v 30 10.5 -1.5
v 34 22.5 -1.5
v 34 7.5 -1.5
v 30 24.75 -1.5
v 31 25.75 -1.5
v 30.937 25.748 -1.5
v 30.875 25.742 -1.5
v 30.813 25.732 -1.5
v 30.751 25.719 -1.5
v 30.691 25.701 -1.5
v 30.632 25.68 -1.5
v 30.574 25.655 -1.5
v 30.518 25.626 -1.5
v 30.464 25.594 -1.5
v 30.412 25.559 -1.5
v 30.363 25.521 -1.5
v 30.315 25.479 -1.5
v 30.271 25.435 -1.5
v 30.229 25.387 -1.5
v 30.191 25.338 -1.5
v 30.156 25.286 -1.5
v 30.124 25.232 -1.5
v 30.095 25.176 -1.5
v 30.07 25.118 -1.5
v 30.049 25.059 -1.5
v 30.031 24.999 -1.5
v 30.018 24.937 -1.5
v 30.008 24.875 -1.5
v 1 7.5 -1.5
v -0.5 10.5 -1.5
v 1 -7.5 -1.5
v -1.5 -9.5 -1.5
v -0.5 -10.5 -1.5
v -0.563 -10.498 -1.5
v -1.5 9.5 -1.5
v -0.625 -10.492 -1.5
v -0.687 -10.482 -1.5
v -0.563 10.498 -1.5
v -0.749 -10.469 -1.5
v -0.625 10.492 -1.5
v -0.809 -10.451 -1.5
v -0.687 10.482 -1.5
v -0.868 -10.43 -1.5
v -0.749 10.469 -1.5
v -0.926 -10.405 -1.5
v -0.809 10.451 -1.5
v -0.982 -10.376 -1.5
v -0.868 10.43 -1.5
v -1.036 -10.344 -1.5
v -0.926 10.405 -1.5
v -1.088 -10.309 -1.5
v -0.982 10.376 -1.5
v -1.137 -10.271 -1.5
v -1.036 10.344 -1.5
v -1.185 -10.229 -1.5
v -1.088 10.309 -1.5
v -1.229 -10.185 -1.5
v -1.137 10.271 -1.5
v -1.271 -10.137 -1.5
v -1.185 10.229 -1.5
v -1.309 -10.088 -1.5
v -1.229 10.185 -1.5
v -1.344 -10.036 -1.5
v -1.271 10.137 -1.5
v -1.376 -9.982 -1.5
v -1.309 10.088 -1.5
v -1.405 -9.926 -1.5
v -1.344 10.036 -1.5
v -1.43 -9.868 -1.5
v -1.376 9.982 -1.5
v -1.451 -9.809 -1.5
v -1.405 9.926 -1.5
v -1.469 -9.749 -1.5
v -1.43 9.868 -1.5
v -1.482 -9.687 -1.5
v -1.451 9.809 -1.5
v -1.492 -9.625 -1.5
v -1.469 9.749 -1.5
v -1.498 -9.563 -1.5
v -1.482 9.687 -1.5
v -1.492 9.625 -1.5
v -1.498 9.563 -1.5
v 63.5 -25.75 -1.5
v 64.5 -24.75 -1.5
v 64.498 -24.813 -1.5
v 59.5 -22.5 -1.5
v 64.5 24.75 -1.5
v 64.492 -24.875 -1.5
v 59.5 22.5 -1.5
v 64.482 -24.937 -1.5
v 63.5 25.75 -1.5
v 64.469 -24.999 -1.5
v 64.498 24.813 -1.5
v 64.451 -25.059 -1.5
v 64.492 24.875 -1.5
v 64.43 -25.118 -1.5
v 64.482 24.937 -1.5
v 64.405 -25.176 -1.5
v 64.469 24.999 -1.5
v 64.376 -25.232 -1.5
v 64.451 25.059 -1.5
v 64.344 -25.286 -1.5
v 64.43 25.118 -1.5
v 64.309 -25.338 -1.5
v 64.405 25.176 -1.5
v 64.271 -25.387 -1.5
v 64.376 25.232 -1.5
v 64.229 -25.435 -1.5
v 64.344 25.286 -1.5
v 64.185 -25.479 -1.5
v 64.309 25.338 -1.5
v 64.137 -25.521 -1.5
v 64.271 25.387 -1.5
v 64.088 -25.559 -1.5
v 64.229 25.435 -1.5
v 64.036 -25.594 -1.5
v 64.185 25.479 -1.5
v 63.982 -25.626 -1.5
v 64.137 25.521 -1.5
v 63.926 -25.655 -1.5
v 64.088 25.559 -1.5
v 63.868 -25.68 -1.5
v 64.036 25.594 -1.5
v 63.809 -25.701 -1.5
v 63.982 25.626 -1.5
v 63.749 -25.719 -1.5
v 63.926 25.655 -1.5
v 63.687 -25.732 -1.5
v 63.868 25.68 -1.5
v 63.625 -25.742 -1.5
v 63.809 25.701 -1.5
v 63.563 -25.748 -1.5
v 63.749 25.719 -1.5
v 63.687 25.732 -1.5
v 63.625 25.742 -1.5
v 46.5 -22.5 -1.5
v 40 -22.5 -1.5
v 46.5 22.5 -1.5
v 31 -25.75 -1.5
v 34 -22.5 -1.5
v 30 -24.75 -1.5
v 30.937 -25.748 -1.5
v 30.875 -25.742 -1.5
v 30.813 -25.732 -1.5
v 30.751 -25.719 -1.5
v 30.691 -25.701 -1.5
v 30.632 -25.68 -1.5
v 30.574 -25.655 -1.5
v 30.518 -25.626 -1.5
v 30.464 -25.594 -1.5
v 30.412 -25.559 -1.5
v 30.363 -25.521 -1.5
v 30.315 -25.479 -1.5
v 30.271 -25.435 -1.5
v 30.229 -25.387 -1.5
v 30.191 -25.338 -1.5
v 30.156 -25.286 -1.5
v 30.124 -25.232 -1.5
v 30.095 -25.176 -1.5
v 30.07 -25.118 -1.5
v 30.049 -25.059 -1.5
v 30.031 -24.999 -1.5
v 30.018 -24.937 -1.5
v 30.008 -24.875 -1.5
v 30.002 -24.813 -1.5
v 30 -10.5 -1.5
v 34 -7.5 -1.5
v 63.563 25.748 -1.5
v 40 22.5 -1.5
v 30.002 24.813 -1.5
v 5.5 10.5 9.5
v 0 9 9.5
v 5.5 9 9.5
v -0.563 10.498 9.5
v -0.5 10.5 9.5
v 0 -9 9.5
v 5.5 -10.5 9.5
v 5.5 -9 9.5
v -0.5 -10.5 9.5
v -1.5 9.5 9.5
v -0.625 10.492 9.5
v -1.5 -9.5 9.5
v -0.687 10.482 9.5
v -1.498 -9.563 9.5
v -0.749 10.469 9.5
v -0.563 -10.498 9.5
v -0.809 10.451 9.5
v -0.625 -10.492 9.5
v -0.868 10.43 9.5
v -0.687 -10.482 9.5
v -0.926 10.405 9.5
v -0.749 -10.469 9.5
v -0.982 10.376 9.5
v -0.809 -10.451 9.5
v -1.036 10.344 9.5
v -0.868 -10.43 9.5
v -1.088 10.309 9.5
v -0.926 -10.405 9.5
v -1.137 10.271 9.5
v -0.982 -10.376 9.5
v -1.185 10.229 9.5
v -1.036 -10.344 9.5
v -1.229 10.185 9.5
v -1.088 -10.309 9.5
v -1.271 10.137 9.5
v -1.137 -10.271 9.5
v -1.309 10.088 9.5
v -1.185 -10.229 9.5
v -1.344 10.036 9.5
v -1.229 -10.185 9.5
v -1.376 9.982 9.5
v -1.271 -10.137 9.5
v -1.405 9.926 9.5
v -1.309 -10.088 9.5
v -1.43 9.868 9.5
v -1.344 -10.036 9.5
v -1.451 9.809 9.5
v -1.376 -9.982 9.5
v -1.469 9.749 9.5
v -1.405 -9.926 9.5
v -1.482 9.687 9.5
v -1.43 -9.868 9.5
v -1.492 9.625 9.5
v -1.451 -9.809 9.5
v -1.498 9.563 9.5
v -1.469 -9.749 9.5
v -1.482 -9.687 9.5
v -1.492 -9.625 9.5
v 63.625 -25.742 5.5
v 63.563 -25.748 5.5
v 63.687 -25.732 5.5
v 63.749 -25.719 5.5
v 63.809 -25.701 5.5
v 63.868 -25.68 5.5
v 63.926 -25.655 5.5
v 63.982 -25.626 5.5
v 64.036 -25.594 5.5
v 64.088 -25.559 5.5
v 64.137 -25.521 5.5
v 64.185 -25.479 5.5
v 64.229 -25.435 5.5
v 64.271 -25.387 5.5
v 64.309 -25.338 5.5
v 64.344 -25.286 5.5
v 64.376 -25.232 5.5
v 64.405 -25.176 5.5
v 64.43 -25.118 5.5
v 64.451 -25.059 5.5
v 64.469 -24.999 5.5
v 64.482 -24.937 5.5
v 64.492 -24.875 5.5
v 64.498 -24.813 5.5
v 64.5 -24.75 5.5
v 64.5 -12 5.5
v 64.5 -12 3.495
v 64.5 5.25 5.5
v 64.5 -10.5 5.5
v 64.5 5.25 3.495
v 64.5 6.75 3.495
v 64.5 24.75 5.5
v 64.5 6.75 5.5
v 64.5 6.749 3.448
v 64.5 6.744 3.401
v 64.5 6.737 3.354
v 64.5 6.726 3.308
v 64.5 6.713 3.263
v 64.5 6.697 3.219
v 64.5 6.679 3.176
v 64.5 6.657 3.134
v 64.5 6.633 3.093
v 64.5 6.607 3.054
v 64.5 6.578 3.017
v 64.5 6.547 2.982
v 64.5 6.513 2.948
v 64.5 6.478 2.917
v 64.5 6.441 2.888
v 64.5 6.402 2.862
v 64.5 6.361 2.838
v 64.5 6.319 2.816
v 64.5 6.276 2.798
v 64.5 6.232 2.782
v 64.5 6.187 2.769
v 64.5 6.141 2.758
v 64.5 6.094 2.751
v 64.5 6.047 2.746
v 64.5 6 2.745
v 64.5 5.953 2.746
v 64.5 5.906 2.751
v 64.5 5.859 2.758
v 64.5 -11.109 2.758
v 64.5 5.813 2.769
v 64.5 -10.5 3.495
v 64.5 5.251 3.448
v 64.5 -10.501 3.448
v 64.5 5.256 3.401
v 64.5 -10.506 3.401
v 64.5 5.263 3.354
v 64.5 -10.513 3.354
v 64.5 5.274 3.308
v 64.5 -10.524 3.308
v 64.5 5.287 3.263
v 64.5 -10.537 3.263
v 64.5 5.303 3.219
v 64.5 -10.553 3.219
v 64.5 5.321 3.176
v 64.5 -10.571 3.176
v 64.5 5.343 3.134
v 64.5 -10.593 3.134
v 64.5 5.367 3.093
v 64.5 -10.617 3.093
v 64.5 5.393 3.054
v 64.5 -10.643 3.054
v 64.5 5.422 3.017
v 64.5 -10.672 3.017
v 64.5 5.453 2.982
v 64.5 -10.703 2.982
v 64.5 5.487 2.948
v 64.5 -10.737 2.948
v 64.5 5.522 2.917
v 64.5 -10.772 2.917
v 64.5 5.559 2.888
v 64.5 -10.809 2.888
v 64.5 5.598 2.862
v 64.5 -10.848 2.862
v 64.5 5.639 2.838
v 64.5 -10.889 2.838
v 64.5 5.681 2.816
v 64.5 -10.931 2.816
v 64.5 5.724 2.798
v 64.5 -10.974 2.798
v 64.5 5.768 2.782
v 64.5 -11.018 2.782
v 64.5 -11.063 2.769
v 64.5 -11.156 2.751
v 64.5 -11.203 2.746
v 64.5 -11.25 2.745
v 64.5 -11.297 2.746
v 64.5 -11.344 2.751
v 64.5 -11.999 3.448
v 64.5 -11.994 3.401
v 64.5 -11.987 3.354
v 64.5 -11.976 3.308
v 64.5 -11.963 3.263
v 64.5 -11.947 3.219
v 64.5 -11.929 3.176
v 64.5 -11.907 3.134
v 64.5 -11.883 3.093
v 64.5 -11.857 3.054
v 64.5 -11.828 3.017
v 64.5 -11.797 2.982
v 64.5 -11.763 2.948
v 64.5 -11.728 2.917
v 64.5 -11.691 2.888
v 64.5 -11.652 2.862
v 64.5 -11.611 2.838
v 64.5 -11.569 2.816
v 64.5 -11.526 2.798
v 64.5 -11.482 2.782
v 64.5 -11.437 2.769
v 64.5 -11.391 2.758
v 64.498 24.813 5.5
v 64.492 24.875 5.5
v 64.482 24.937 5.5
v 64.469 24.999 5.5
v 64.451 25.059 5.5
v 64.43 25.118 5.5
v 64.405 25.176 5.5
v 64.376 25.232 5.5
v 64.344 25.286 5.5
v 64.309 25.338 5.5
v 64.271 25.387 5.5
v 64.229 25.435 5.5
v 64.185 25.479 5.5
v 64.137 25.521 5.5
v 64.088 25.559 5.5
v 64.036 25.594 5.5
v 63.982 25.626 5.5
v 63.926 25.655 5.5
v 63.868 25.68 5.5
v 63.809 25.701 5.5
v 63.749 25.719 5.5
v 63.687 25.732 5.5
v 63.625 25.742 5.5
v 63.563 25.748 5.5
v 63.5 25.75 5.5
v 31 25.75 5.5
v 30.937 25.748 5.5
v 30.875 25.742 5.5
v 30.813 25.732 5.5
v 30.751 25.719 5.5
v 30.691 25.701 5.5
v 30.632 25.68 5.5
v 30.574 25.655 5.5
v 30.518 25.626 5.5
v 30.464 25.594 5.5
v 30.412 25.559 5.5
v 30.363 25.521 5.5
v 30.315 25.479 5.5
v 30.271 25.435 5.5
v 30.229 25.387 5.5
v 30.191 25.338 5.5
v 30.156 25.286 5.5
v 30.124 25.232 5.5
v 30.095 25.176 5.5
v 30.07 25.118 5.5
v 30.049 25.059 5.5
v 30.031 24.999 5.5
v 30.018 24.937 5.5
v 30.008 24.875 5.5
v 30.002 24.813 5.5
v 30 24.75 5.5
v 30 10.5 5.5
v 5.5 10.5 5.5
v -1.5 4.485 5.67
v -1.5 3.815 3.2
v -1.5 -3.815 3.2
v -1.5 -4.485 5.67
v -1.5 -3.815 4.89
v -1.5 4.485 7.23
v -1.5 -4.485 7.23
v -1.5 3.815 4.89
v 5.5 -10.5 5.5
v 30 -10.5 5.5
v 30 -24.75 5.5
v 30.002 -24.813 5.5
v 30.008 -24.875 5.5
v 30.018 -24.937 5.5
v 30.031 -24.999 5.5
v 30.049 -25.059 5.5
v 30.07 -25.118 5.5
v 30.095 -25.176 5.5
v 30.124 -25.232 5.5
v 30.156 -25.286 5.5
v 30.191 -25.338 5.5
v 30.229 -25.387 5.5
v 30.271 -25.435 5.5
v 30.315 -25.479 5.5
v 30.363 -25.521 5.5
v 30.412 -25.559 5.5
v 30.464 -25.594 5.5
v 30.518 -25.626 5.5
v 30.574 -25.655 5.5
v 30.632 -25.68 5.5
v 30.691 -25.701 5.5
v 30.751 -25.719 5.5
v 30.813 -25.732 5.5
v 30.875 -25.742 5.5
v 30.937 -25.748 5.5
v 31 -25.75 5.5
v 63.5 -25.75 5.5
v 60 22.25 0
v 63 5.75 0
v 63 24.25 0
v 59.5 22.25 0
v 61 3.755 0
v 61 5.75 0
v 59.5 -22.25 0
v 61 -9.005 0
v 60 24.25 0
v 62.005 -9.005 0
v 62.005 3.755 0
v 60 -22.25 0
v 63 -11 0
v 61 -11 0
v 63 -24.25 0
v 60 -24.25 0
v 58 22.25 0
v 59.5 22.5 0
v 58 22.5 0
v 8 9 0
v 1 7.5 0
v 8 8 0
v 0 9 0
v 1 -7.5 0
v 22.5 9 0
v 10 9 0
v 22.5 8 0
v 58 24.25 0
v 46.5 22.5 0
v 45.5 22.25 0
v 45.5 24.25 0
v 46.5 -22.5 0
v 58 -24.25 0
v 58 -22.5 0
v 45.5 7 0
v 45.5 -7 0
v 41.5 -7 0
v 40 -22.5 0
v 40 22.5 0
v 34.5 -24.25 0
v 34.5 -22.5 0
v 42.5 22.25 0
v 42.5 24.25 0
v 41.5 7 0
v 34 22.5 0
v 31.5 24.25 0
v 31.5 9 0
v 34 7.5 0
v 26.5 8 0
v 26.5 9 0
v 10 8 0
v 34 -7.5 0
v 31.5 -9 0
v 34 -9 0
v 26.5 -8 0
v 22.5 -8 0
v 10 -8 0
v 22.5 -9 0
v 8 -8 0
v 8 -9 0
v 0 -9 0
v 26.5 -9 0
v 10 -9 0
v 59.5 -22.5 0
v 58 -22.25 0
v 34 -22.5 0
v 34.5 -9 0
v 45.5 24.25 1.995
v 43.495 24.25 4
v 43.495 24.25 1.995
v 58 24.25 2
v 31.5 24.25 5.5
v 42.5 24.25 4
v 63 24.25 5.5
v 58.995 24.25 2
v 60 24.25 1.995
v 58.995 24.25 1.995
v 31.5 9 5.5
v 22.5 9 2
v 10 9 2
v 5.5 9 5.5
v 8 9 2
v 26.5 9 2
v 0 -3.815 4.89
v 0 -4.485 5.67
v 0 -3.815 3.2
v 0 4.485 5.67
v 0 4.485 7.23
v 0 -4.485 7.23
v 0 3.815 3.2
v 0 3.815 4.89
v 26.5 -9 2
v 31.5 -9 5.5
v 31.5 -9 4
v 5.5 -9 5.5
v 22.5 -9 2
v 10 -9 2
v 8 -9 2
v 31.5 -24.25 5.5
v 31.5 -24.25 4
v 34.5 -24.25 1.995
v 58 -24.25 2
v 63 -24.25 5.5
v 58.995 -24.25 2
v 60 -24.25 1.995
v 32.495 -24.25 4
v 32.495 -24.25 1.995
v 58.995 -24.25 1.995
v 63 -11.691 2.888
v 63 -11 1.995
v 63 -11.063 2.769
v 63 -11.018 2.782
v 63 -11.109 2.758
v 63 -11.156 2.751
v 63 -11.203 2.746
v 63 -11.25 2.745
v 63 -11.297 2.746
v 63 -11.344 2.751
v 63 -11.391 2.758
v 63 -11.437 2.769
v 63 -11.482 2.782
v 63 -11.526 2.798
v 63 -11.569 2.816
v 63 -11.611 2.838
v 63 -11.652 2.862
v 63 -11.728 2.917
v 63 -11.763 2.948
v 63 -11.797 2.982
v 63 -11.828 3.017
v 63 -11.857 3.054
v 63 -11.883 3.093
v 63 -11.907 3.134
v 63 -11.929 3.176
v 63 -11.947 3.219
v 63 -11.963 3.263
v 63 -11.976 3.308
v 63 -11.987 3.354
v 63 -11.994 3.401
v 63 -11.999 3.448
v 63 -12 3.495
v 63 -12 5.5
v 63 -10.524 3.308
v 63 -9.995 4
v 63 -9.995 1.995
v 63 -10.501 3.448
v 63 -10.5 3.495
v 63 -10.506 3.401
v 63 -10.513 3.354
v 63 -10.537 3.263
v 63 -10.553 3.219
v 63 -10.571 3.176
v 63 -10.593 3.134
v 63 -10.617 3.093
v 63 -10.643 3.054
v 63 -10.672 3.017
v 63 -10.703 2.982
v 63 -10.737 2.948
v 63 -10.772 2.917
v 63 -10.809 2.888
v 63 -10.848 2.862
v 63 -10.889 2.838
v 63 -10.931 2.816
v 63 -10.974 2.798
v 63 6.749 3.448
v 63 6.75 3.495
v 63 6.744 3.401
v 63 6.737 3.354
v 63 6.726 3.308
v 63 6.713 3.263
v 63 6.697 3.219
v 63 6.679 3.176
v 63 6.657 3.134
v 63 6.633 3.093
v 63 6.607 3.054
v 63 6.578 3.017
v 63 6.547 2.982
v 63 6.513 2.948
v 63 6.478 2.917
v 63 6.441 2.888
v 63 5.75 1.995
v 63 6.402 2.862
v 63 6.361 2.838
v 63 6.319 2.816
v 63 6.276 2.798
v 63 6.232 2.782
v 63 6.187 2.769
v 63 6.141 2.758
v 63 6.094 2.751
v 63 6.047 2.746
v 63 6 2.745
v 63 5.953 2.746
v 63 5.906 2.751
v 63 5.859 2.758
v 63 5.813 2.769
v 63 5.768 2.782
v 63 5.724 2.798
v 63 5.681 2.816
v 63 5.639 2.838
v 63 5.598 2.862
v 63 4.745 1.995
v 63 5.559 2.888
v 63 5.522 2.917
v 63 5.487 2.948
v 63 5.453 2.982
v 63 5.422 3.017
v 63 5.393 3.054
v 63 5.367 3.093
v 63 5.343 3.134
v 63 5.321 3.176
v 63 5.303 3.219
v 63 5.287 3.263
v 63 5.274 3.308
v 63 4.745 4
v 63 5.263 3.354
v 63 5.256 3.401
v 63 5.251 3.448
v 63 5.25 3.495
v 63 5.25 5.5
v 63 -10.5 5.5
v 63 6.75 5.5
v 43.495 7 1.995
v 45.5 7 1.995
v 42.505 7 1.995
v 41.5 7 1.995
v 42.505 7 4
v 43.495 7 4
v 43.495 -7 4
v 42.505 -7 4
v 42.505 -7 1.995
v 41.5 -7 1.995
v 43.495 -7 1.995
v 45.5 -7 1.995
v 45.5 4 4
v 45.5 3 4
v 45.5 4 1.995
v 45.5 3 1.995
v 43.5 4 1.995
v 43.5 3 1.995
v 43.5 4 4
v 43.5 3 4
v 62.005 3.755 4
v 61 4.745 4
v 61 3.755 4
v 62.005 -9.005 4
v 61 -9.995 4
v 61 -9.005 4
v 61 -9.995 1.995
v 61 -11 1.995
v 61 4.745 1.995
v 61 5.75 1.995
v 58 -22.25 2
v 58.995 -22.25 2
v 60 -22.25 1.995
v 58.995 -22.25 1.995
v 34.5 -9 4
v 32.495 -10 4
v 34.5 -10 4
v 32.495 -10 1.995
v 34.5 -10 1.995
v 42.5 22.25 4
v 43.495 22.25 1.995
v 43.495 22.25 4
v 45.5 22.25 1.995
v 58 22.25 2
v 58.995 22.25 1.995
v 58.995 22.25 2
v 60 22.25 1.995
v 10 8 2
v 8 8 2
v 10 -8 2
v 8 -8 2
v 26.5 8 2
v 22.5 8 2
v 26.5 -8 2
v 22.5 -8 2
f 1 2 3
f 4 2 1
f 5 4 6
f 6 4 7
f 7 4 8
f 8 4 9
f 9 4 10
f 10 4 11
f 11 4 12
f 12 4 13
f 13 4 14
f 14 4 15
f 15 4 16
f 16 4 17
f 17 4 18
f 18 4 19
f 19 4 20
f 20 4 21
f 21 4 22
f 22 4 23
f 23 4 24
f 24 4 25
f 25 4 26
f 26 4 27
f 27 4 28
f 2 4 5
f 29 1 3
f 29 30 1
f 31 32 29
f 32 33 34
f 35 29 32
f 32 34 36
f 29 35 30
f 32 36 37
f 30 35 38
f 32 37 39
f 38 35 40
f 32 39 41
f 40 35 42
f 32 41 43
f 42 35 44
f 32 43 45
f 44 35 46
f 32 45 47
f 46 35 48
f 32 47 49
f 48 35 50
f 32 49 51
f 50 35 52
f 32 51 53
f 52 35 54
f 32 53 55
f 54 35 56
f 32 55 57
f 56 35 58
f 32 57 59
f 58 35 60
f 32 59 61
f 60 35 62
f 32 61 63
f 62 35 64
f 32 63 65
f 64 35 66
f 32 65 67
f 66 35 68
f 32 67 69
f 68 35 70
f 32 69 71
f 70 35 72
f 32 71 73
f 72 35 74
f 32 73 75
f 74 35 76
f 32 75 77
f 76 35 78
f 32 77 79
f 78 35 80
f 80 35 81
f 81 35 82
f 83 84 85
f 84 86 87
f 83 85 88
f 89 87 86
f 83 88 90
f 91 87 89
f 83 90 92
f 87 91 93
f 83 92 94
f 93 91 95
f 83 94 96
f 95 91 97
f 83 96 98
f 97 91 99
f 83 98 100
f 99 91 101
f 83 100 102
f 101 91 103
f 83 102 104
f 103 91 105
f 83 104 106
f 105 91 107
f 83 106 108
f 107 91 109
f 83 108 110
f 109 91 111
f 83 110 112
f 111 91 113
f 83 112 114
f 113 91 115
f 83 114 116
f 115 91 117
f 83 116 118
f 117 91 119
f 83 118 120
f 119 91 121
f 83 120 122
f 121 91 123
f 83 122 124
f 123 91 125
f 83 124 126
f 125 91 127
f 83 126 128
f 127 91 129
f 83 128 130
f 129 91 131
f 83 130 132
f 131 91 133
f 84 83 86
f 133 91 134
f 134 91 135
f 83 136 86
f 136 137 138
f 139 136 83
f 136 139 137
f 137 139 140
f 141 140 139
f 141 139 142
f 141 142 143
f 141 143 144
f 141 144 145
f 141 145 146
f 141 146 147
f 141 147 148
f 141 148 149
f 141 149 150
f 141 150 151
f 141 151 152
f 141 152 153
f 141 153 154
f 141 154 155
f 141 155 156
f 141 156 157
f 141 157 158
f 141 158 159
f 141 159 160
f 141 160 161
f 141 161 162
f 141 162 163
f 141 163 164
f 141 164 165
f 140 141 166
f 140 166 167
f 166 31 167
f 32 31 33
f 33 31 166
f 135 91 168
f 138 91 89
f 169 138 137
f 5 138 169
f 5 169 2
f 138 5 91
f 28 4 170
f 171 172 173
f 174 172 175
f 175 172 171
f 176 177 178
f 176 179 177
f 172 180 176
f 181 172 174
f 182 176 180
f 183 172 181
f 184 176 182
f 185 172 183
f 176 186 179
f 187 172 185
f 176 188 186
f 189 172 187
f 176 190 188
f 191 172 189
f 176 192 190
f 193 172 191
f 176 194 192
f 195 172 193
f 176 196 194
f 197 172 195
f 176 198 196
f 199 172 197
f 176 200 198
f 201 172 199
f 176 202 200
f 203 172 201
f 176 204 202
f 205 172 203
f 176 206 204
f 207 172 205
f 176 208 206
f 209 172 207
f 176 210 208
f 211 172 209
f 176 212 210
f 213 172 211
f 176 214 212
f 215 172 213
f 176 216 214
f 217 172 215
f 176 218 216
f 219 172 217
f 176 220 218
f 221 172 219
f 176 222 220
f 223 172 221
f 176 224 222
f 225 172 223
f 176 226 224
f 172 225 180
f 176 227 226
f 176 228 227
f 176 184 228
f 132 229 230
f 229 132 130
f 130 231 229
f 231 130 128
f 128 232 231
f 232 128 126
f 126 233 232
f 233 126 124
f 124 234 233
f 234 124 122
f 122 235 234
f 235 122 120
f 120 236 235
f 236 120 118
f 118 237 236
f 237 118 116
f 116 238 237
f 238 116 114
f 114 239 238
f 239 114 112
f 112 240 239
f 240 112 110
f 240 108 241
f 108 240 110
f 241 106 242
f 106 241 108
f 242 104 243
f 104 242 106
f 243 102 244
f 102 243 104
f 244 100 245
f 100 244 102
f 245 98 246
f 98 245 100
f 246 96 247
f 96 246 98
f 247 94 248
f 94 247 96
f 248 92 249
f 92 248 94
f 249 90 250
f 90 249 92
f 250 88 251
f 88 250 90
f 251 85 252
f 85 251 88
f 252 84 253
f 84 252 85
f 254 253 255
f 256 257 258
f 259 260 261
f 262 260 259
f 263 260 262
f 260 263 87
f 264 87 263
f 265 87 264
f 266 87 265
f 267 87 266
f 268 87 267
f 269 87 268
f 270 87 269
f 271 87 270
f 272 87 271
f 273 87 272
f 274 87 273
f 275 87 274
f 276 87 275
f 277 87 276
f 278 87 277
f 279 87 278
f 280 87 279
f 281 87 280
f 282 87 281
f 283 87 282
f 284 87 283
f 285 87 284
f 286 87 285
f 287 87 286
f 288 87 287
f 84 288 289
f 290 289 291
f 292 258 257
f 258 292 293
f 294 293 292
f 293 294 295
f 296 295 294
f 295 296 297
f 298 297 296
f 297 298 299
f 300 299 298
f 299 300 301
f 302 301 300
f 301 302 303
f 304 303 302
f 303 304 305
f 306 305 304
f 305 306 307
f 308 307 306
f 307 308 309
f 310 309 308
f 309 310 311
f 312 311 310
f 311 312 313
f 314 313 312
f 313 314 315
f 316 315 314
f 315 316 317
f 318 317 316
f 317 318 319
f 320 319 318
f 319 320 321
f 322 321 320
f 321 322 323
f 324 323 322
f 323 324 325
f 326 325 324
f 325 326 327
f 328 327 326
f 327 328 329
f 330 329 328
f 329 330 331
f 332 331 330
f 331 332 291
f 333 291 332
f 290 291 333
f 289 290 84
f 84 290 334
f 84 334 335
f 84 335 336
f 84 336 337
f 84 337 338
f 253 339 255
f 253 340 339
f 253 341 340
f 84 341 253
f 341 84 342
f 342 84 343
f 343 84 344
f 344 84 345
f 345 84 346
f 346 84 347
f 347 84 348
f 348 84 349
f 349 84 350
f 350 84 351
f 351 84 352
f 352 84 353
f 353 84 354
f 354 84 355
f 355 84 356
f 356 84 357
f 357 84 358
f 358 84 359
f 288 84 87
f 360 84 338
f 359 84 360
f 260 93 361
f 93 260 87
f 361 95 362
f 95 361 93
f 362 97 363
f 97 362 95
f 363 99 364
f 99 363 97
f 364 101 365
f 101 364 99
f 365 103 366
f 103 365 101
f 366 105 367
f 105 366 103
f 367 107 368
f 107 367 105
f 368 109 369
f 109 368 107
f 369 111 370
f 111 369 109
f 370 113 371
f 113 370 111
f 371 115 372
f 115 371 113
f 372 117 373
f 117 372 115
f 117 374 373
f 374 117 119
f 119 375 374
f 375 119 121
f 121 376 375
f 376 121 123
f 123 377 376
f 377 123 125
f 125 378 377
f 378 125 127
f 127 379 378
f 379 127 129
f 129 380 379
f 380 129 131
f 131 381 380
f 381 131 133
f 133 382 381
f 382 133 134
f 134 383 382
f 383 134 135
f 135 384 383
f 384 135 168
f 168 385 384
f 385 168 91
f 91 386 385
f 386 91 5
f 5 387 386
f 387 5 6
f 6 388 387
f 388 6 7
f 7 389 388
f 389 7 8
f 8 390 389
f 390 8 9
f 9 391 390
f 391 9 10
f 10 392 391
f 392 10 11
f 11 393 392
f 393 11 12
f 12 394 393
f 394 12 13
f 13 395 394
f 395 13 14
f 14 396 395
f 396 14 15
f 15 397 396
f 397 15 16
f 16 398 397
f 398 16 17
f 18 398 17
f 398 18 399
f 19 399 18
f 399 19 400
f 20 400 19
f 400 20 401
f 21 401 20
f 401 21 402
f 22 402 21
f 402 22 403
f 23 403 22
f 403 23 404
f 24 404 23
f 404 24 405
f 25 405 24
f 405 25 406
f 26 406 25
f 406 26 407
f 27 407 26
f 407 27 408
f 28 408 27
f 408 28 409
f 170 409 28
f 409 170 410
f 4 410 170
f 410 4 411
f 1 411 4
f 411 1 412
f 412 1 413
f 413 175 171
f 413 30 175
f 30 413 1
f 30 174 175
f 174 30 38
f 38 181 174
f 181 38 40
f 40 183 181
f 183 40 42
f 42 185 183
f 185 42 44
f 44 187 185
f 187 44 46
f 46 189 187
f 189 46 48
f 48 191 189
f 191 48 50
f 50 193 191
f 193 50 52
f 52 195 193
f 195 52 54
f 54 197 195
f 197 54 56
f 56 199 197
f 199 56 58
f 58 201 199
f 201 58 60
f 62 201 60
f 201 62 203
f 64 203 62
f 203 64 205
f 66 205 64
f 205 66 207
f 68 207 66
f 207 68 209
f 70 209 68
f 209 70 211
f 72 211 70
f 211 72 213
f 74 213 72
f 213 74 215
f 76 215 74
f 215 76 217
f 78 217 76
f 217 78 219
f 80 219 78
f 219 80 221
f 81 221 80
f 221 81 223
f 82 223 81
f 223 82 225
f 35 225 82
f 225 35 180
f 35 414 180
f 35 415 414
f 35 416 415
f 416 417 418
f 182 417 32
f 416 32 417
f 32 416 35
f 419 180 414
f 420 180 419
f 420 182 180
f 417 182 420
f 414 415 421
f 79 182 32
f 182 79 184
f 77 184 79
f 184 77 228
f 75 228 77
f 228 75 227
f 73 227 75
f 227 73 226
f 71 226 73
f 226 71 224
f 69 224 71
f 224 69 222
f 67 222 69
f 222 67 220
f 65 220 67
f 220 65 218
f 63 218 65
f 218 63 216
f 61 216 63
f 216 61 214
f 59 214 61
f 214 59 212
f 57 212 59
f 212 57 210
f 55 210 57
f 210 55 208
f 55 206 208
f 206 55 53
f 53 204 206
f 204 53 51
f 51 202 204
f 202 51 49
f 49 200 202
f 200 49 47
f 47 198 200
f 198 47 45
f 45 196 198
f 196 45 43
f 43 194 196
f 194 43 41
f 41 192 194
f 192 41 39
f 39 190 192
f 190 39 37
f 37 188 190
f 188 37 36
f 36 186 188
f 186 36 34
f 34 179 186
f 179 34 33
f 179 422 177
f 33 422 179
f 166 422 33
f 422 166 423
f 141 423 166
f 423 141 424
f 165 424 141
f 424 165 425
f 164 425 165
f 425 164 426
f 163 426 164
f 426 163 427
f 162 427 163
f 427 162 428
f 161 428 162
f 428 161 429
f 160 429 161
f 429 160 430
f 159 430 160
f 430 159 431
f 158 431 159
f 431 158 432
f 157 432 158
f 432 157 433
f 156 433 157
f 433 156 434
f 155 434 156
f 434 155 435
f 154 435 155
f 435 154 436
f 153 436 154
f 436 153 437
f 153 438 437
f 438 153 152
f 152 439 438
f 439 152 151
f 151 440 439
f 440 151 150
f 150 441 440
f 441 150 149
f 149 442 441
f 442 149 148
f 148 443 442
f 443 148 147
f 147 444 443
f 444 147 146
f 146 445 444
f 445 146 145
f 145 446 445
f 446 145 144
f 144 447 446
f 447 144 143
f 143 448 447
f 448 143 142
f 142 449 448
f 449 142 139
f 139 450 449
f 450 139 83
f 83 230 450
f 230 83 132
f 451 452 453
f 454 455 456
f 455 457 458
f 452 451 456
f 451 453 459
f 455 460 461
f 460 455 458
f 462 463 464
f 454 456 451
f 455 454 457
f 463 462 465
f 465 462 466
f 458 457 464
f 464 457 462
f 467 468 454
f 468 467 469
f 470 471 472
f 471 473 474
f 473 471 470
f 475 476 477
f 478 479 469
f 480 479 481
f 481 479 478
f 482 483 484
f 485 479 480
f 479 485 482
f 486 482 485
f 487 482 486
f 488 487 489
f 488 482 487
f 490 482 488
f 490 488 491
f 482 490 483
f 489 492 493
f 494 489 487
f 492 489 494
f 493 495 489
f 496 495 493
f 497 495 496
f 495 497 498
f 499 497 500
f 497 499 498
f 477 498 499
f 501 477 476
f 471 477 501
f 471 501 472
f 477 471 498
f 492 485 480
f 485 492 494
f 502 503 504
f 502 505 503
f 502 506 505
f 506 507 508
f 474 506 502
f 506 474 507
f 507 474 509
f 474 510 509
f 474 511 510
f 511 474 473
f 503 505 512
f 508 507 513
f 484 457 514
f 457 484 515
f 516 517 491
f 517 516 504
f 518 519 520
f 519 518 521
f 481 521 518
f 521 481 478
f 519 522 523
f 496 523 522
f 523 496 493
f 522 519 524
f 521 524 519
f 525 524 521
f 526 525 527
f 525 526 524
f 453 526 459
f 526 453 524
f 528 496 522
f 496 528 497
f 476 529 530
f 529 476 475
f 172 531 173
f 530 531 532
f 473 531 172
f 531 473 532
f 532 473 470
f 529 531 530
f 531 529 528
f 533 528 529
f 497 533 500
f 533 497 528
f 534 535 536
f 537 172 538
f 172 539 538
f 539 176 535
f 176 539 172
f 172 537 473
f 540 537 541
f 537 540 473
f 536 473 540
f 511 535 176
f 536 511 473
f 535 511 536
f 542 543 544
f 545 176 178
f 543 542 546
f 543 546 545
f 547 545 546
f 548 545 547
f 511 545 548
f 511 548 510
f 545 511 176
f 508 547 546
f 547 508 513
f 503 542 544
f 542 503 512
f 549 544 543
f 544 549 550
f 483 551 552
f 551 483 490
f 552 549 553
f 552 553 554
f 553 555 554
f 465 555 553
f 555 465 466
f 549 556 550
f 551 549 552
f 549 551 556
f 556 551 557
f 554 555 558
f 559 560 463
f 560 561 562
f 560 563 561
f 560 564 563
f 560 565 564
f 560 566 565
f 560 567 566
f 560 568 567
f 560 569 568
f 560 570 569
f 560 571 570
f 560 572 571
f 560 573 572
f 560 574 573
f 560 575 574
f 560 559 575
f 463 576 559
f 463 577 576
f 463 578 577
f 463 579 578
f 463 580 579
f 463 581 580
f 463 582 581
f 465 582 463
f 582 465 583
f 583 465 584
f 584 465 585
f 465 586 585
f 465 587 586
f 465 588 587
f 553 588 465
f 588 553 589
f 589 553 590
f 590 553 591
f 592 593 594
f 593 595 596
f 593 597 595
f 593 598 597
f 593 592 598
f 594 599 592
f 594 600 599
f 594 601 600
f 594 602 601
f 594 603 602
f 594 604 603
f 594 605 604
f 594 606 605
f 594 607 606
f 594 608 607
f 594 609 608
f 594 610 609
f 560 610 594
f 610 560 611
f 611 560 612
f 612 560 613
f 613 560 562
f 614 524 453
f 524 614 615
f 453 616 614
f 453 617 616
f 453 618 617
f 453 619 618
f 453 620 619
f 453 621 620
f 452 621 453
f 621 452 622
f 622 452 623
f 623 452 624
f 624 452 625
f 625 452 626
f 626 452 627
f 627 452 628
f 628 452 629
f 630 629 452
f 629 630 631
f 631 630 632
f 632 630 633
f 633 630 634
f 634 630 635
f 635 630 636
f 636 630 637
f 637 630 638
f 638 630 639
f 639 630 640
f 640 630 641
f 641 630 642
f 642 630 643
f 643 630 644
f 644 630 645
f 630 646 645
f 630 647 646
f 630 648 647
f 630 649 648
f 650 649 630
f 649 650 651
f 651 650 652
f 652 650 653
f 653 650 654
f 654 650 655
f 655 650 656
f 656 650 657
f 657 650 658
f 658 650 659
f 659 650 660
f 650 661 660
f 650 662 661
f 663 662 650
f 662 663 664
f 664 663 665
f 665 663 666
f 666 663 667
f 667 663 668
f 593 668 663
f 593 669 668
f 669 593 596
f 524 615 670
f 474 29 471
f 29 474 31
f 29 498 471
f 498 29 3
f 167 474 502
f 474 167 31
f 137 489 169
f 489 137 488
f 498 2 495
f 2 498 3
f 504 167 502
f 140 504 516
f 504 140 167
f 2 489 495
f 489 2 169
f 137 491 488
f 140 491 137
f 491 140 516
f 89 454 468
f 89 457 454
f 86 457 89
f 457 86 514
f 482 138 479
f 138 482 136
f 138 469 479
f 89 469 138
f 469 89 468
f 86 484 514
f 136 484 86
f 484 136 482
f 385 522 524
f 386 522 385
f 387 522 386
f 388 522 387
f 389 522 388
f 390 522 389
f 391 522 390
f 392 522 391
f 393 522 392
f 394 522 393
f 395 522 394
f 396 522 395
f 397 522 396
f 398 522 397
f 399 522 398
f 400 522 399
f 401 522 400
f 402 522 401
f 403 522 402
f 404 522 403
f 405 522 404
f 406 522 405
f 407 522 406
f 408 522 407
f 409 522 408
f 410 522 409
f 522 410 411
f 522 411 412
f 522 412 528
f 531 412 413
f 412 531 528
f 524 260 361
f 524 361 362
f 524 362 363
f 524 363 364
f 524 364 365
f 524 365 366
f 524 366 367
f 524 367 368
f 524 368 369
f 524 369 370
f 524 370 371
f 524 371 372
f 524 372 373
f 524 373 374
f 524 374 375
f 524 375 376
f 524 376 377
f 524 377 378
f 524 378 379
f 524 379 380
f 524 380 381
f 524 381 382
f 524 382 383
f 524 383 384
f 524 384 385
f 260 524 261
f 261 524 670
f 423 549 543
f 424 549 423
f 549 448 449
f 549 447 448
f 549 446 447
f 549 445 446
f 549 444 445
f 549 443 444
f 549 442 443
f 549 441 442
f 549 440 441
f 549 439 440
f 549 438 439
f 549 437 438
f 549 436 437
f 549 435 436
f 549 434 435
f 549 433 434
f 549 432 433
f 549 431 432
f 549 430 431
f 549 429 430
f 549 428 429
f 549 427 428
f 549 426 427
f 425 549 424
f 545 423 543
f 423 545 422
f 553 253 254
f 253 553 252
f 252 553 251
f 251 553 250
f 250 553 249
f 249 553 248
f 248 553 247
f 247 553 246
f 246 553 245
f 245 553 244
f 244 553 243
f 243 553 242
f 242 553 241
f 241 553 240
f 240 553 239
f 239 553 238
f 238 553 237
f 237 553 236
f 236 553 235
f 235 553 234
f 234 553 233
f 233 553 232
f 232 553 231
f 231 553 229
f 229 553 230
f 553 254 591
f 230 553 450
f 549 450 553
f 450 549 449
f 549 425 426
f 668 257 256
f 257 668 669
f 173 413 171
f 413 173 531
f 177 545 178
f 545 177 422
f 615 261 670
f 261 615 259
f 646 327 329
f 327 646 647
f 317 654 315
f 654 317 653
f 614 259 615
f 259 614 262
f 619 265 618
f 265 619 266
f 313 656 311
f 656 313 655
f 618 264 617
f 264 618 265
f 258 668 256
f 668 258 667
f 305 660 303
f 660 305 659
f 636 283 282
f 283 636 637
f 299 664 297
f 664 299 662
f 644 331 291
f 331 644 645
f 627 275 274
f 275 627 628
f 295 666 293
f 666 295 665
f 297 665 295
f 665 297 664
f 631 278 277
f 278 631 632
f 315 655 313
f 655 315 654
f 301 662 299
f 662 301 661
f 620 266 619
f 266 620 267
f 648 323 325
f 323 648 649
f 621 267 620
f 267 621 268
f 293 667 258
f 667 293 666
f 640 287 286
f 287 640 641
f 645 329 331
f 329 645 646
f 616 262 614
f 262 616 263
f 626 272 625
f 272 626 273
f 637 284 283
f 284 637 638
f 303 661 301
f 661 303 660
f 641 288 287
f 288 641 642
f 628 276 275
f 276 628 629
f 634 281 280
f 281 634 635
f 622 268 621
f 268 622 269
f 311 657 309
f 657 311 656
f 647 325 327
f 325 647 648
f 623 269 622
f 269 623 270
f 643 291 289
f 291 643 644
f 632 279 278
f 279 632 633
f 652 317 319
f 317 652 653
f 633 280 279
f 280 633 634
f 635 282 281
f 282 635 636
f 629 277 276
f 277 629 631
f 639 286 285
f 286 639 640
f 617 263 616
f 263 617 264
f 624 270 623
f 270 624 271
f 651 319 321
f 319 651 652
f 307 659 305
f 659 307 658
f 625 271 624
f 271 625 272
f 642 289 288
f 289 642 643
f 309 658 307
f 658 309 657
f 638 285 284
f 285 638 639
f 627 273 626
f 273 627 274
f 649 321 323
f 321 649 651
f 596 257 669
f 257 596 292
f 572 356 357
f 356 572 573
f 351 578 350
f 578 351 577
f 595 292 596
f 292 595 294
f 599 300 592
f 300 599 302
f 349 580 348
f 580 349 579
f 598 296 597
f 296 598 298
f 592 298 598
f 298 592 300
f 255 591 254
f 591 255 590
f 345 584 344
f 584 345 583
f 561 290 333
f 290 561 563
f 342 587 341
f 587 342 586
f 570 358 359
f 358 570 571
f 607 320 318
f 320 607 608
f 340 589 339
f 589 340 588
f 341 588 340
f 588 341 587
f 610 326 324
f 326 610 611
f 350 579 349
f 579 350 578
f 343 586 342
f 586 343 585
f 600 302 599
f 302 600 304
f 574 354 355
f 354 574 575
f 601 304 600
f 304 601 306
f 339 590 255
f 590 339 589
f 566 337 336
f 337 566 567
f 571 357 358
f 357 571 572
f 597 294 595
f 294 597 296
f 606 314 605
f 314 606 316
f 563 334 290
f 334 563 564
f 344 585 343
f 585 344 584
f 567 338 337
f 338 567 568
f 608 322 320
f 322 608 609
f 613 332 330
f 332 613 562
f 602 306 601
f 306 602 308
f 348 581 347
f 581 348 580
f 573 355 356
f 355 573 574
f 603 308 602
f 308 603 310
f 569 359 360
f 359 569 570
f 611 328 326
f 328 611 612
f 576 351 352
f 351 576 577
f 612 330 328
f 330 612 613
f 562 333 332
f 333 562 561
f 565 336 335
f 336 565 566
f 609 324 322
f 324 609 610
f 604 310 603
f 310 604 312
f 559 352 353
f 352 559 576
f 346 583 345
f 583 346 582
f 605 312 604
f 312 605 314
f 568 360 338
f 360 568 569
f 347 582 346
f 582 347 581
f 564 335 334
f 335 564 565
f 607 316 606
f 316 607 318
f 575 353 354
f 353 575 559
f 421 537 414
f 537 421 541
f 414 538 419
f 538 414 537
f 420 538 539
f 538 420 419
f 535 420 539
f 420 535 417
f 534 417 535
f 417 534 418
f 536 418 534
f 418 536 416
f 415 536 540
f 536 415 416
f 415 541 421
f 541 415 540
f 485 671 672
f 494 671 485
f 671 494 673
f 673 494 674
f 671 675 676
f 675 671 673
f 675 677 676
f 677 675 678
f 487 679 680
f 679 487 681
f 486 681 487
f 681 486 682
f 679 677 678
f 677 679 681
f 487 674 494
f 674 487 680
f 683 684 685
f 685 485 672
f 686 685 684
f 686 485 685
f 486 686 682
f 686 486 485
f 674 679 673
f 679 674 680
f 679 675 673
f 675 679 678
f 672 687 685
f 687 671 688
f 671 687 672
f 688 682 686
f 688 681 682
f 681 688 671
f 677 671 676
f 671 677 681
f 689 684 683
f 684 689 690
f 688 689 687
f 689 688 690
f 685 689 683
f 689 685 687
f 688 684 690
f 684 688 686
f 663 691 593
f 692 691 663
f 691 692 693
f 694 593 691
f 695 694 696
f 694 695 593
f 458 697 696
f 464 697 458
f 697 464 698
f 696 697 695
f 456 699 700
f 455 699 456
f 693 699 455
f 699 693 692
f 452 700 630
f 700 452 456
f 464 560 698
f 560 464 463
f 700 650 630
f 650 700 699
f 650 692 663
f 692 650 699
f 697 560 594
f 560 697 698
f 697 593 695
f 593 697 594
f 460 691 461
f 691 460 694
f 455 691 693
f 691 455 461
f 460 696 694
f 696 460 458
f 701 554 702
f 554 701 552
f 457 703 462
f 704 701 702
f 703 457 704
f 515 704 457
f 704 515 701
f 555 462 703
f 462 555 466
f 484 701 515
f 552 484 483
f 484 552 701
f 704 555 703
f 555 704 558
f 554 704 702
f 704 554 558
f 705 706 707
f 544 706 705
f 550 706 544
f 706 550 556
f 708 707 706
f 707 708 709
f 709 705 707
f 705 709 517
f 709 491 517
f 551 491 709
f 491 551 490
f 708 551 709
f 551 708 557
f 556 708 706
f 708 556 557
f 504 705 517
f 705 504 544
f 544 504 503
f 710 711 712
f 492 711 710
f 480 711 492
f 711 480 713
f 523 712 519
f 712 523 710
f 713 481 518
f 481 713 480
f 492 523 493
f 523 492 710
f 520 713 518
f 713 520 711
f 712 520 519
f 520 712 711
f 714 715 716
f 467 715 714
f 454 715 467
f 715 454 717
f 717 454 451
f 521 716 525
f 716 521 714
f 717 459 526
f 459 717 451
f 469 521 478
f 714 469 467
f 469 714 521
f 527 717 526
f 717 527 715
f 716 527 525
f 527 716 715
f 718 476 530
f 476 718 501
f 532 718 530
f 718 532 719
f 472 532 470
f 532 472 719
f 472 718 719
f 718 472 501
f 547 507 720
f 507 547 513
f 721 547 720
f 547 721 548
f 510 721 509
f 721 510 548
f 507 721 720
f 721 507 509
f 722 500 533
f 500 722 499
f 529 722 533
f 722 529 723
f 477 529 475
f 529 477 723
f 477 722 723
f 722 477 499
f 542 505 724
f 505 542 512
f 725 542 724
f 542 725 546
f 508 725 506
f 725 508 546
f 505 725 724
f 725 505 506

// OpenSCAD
// file: components.scad
module usb(){
  usb_t_w = 6.9;
  usb_b_w = 5.87;
  usb_t_h = 3.1;
  usb_mt_h = 1.9;
  usb_mb_h = 1.3;
  polygon(points=[[-usb_t_w/2, usb_t_h], [-usb_t_w/2, usb_mt_h], [-usb_b_w/2, usb_mb_h], [-usb_b_w/2, 0], [usb_b_w/2, 0], [usb_b_w/2, usb_mb_h], [usb_t_w/2, usb_mt_h], [usb_t_w/2, usb_t_h]]);
};
arduino();
module arduino(h = 1.1, l = 42, w = 18){
  l = 42;
  
  led_l = 2;
  led_w = 7.5;
  led_h = 0.75;
  led_offset = [12, 0, h/2 + led_h/2];
  
  reset_base_h = 1.5;
  reset_base_l = 6;
  reset_base_w = 3;
  reset_button_h = 1;
  reset_button_l = 2.5;
  reset_button_w = 1;
  reset_base_offset = [4 + reset_base_w/2, 0, h/2 + reset_base_h/2];
  reset_button_offset = [4 + reset_base_w/2, 0, h/2 + reset_base_h + reset_button_h/2];
  
  usb_l = 9;
  usb_w = 7;
  usb_h = 4;
  usb_offset = [-l/2 + 3, 0, 1.5 + h/2];
  
  capa_l = 3;
  capa_w = 1.5;
  capa_h = 1.5;
  
  
  reserved_w = 2;
  reserved_h = 3;
  
  digital_l = 5;
  digital_reserved_offset = [5.5, w/2 - reserved_w/2, 0];
  
  power_l = 8;
  power_reserved_offset = [12.5, -w/2 + reserved_w/2, 0];
  
  union()
  
  color("green")
  cube([l, w, h], center=true);
  
  translate(led_offset)
  color("grey")
  cube([led_l, led_w, led_h], center=true);
  
  translate(reset_base_offset)
  color("grey")
  cube([reset_base_w, reset_base_l, reset_base_h], center=true);
  
  translate(reset_button_offset)
  color("white")
  cube([reset_button_w, reset_button_l, reset_button_h], center=true);
  
  translate(usb_offset)
  color("grey")
  union(){
    translate([-3, 0, -1.1])
    rotate([90, 0, 90])
    linear_extrude(2, center=true){
      usb();
    }
    cube([usb_l-4, usb_w, usb_h], center=true);
  }
  
  translate([-l/2 +2, 5, -t/2 - capa_h/2])
  color("orange")
  cube([capa_l, capa_w, capa_h], center=true);
  
  translate([l/2 -8, -3, -t/2 - capa_h/2])
  color("orange")
  cube([capa_l, capa_w, capa_h], center=true);
  
  translate(digital_reserved_offset)
  color("white")
  cube([digital_l, reserved_w, reserved_h], center=true);
  
  translate(power_reserved_offset)
  color("white")
  cube([power_l, reserved_w, reserved_h], center=true);
}

module tx(l = 19, w = 19, t = 1){  
  transmitter_h = 3;
  transmitter_r = 4.5;
  transmitter_offset = [0, 3, transmitter_h/2];
  
  coil1_h = 3;
  coil1_l = 6;
  coil1_offset = [-3, -5, coil1_h/2 + t/2];
  
  coil2_h = 3;
  coil2_l = 3;
  coil2_offset = [3, -5, coil1_h/2 + t/2];
  
  chip_l = 3;
  chip_w = 1.5;
  chip_h = 1.5;
  
  antenna_offset = [9, -8.2, 1];
  
  reserved_w = 2;
  reserved_h = 3;
  reserved_l = 5;
  digital_reserved_offset = [-w/2 + reserved_w/2, -l/2 + reserved_l/2 + 5, 0];
  
  translate([0, 0, t/2]){
    union()
  
    color("green")
    cube([l, w, t], center=true);
    
    translate(transmitter_offset)
    color("grey")
    cylinder(transmitter_h, transmitter_r, transmitter_r, center=true);
    
    translate(coil1_offset)
    color("red")
    rotate([0, 90, 75])
    cylinder(coil1_l, coil1_h/2, coil1_h/2, center=true, $fn = 100);
    
    translate(coil2_offset)
    color("red")
    rotate([0, 90, -15])
    cylinder(coil2_l, coil2_h/2, coil2_h/2, center=true, $fn = 100);
    
    translate([3, 2, - chip_h/2 - t/2])
    color("grey")
    cube([chip_l, chip_w, chip_h], center=true);
    
    translate(antenna_offset)
    rotate([180, 0, 90])
    color("red")
    antenna();
      
    translate(digital_reserved_offset)
    color("white")
    cube([reserved_w, reserved_l, reserved_h], center=true);
  }
}

module rx(l = 30, w = 13, h = 1){  
  coil_h = 3;
  coil_l = 3;
  coil_offset = [-l/2 + 3, -4, coil_h/2 + h/2];
  
  resistance_h = 4;
  resistance_l = 8;
  resistance_w = 2;
  resistance_offset = [-l/2 + 10, -2, resistance_h/2 + h/2];
  
  var_resistance_h = 6;
  var_resistance_l = 5;
  var_resistance_offset = [var_resistance_l/2, 0, var_resistance_h/2 + h/2];
  
  chip_l = 3;
  chip_w = 1.5;
  chip_h = 1.5;
  
  antenna_offset = [-15, -5.4, 1];
  
  reserved_w = 2;
  reserved_h = 3;
  reserved_l = 5;
  digital_reserved_offset = [l/2 - reserved_l/2 - 4, - w/2 + reserved_w/2, 0];
  
  translate([0, 0, h/2]){
    union()
    
    color("green")
    cube([l, w, t], center=true);
    
    translate(coil_offset)
    color("red")
    rotate([0, 90, 20])
    cylinder(coil_l, coil_h/2, coil_h/2, center=true, $fn = 100);
    
    translate(resistance_offset)
    color("grey")
    cube([resistance_w, resistance_l, resistance_h], center=true);
    
    translate(var_resistance_offset)
    color("grey")
    rotate([0, 0, 20])
    cube([var_resistance_l, var_resistance_l, var_resistance_h], center=true);
    
    translate([3, 2, - chip_h/2 - h/2])
    color("grey")
    cube([chip_l, chip_w, chip_h], center=true);
    
    translate(antenna_offset)
    rotate([0, 0, 90])
    color("red")
    antenna();
    
    translate(digital_reserved_offset)
    color("white")
    cube([reserved_l, reserved_w, reserved_h], center=true);
  }

}

module antenna(){
  antenna_l = 19;
  antenna_r = 3;
  antenna_tige = 8;
  
  translate([0, antenna_l/2 + antenna_tige, 0])
  rotate([90, 90, 0])
  {
    union()
    
    color("red")
    cylinder(antenna_l, antenna_r, antenna_r, center=true, $fn = 100);
    
    color("red")
    translate([0, 0, antenna_l/2 + antenna_tige/2])
    cylinder(antenna_tige, 0.3, 0.3, center=true, $fn = 100);
  }
}
// main file
use <components.scad>

main(
  arduino_l = 42.5,
  arduino_w = 18,
  arduino_t = 1.1,
  
  tx_l = 19+0.5,
  tx_w = 19+0.5,
  tx_antenna_offset_x = 0.5,
  
  rx_l = 30+1-0.5,
  rx_w = 13+0.75+0.5,
  rx_antenna_offset_x = 0.5,
  
  antenna_hole_l = 1.5,

  usb_l = 7.8,
  usb_h = 4,
  usb_d = 1.5,
  usb_offset_z = 3.2,


  case_h = 11,
  case_t = 1.5,
  sep_arduino_rx = 0.5,
  sep_arduino_tx = 1,

  support_h = 2,
  support_extra_h = 2,
  
  arduino_support_front_l = 2,
  arduino_support_front_w = 1,
  
  arduino_support_middle_l = 4,
  arduino_support_middle_w = 1,
  
  rf_double_extra_support_w = 2,
  rf_double_support_l = 1,
  
  rf_simple_support_l = 1,
  rf_simple_support_w = 2,
  
  rx_support_extra_w = 1
);

module main(){
  sep_rx_tx = sep_arduino_rx + rx_w;
  case_big_w = tx_w + rx_w + sep_rx_tx;
  case_small_w = arduino_w;
  case_l = arduino_l + tx_l + sep_arduino_tx;
  case_big_l = rx_l + rx_support_extra_w;
  case_small_l = case_l - case_big_l;
  
  union()
  
    difference(){
      // Box
      box(l_b = case_big_l,
          l_s = case_small_l,
          w_s = case_small_w,
          w_b = case_big_w,
          t = case_t,
          h = case_h);
      
      translate([20, 0, -1])
      cube([38,15,3], center=true);

      translate([37, 0, -1])
      cube([6,45,3], center=true);

      translate([53, 0, -1])
      cube([13,45,3], center=true);
      
      translate([53, 0, case_h - 3])
      cube([95,60,5], center=true);

      // Antennas
      antenna_offset_z = case_h/2 + case_t/2 + 0.25;
      antenna_size = [case_t + 0.02, antenna_hole_l, case_h - support_h - case_t -1.5 + 0.01];
      
      // RX antenna
      translate([case_l + case_t/2, case_big_w/2 - tx_w+antenna_hole_l/2 + tx_antenna_offset_x, antenna_offset_z])
      antenna_hole(antenna_size);

      // TX antenna
      translate([case_l + case_t/2, -case_big_w/2 + rx_w - antenna_hole_l/2 - rx_antenna_offset_x, antenna_offset_z])
      antenna_hole(antenna_size);
      
      // Screw hole
      translate([(arduino_l + case_l)/2, 0, 0])
      cylinder(10,1,1, $fn=100, center=true);

      // Hole for head of screw
      translate([(arduino_l + case_l)/2, 0, -1])
      cylinder(1.01, 4, 3, $fn=100, center=true);
     
      // USB
      translate([-case_t-0.01, 0, usb_offset_z])
      rotate([90, 0, 90])
      scale(1.3)
      linear_extrude(case_t + 0.02){
        usb();
      }
    }
    
    // Support vis
    translate([(arduino_l + case_l)/2, 0, 1])
    *difference(){
    cube([10, 10, 2], center=true);
    cylinder(2+0.02,1,1, $fn=100, center=true);}
    
    // Support Arduino left front
    translate([arduino_support_front_l/2+8, arduino_w/2-arduino_support_front_w/2, support_h/2])
    cube([arduino_support_front_l, arduino_support_front_w, support_h], center=true);

    // Support Arduino right front
    translate([arduino_support_front_l/2+8, -arduino_w/2+arduino_support_front_w/2, support_h/2])
    cube([arduino_support_front_l, arduino_support_front_w, support_h], center=true);   

    // Support Arduino middle left
    support_middle_offset = 5;
    translate([case_small_l-arduino_support_middle_l/2 - support_middle_offset, arduino_w/2-arduino_support_front_w/2, support_h/2])
    cube([arduino_support_middle_l, arduino_support_middle_w, support_h], center=true);   

    // Support Arduino middle right
    translate([case_small_l-arduino_support_middle_l/2 - support_middle_offset, -arduino_w/2+arduino_support_front_w/2, support_h/2])
    cube([arduino_support_middle_l, arduino_support_middle_w, support_h], center=true);   

    // Block Arduino + RX/TX
    translate([arduino_l + sep_arduino_tx/2, 0, 0])
    block_arduino(
      w = sep_arduino_tx,
      l = arduino_w - 4,
      h = support_h,
      extra_h = support_extra_h,
      inner_w = 1,
      tx_inner_offset = 3);
  
    // Support TX/RX wall
    translate([case_big_l+case_small_l-rf_double_support_l/2-0.5, case_big_w/2 - tx_w - sep_rx_tx/2])
    difference(){
      rf_double_support( h = support_h,
                        extra_h = support_extra_h,
                        w = sep_rx_tx,
                        extra_w = rf_double_extra_support_w,
                        l = rf_double_support_l+1);
      translate([-0.5,0,(support_extra_h + support_h)/2])
      cube([1 + 0.01,sep_rx_tx-2 + 0.01,support_extra_h + support_h + 0.01], center=true);
    }

    // Support TX wall right front
    translate([case_big_l+case_small_l-4, -case_big_w/2 + 2/2])
    rf_simple_support(h = support_h,
                    extra_h = 0,
                    w = 1,
                    extra_w = 1,
                    l = 2);
                    
    // Support TX wall right end
    inner_su = 2;
    translate([case_big_l+case_small_l-rx_l-rx_support_extra_w/2+inner_su/2, -case_big_w/2 +rx_w/2])
    union(){
      rf_simple_support(h = support_h,
                        extra_h = support_extra_h,
                        w = rx_support_extra_w,
                        extra_w = inner_su,
                        l = rx_w);
      translate([0, rx_w/2+1/2, (support_h+support_extra_h)/2])
      cube([rx_support_extra_w+inner_su,1,support_h+support_extra_h], center=true);
    }

    // Support RX wall left end
    rf_simple_support_extra_w = 2;
    translate([case_l-tx_l-rf_simple_support_l/2+rf_simple_support_extra_w/2, case_big_w/2 - rf_simple_support_w/2])
    rf_simple_support(h = support_h,
                    extra_h = support_extra_h,
                    w = rf_simple_support_l,
                    extra_w = rf_simple_support_extra_w,
                    l = rf_simple_support_w);
    
    // Support RX wall left front
    translate([case_big_l+case_small_l-4, case_big_w/2 - 2/2])
    rf_simple_support(h = support_h,
                    extra_h = 0,
                    w = 1,
                    extra_w = 1,
                    l = 2);

     // Arduino
    translate([arduino_l/2, 0, support_h+ arduino_t/2])
    *arduino(l = arduino_l, w = arduino_w, t = arduino_t);

    // RX
    translate([case_big_l+case_small_l-rx_l/2, -case_big_w/2 + rx_w/2, support_h])
    rotate([0, 0, 180])
    *rx(l = rx_l, w = rx_w, t = 1);

    // TX
    translate([case_big_l+case_small_l-tx_l/2, case_big_w/2 - tx_w/2, support_h])
    *tx(l = tx_l, w = tx_w, t = 1);
}

module block_arduino(){
  translate([inner_w/2, 0, extra_h/2 +h/2])
  {
    rotate([0, 0, 90])
    union(){
      difference(){
         cube([l, w + 3*inner_w, h + extra_h], center=true);
        
         translate([0, w/2 + inner_w, h/2])
         cube([l + 0.01, inner_w + 0.01, extra_h + 0.01], center=true);
        
         translate([0, -w, h/2])
         cube([l + 0.01, 2*inner_w + 0.01 , extra_h + 0.01], center=true);
      }
    }
    translate([0,tx_inner_offset,-(h+extra_h)/2])
    cube([2,w,h+extra_h]);
  }
}

module rf_double_support(){
  translate([0, 0, (h+extra_h)/2])
  difference(){
    cube([l,w+extra_w,h+extra_h], center=true);
    
    translate([0,w/2+extra_w/4,h/2])
    cube([l+0.01,extra_w/2+0.01,extra_h+0.01], center=true);
    
    translate([0,-w/2-extra_w/4,h/2])
    cube([l+0.01,extra_w/2+0.01,extra_h+0.01], center=true);
  }
}

module rf_simple_support(){
  translate([0, 0, (h+extra_h)/2])
  rotate([0, 0, -90])
  difference(){
    cube([l,w+extra_w,h+extra_h], center=true);
    
    translate([0,w/2,h/2])
    cube([l+0.01,extra_w+0.01,extra_h+0.01], center=true);
  }
}

module arduino_support(
  d = 0){
  rotate(90)
  translate([0, 0, (outer_h + inner_h)/2])
  difference(){
    cube([l, outer_w + inner_w, outer_h + inner_h], center=true);
    translate([d, outer_w/2, outer_h/2]){
      cube([l + 0.01 - d, inner_w + 0.01, inner_h + 0.01], center=true);
    }
  } 
}

module box(){
  r = 2;
  translate([-t, 0, -t])
  difference(){
    linear_extrude(h)
    plaque3(l_b = l_b + 2*t,
      l_s = l_s,
      w_s = w_s + 2*t,
      w_b = w_b + 2*t,
      r = r
    );
    
    translate([t, 0, t])
    linear_extrude(h)
    plaque3(l_b = l_b,
      l_s = l_s,
      w_s = w_s,
      w_b = w_b,
      r = 0
    );
  }
}

module plaque3(){
  difference(){
    polygon(points=[[0,-w_s/2],[l_s,-w_s/2],[l_s,-w_b/2],[l_s+l_b,-w_b/2],[l_b+l_s,w_b/2],[l_s,w_b/2],[l_s,w_s/2],[0,w_s/2]]);
    
    translate([r/2, w_s/2 - r/2])
    rotate([0, 0, 90])
    angle2(r=r);
    
    translate([r/2, - w_s/2 + r/2])
    rotate([0, 0, -180])
    angle2(r=r);
    
    translate([r/2 + l_s, w_b/2 - r/2])
    rotate([0, 0, 90])
    angle2(r=r);
    
    translate([r/2 + l_s, -w_b/2 + r/2])
    rotate([0, 0, -180])
    angle2(r=r);
    
    translate([-r/2 + l_b + l_s, +w_b/2 - r/2])
    rotate([0, 0, 0])
    angle2(r=r);
    
    translate([-r/2 + l_b + l_s, -w_b/2 + r/2])
    rotate([0, 0, 270])
    angle2(r=r);
  }
}

module antenna_hole(antenna_size){
  hull(){
    cube(antenna_size, center=true);
      translate([0, 0, -antenna_size[2]/2])
    rotate([0, 90, 0])
    cylinder(antenna_size[0], antenna_size[1]/2, antenna_size[1]/2, $fn=100, center=true);
  }
}

module angle2(){
  intersection(){
    difference(){
      square([r + 0.01, r + 0.01], center=true);
      circle(r/2, r/2, center=true, $fn=100);
    }
    translate([r/2, r/2]){
      square([r, r], center=true);
    }
  }
}
